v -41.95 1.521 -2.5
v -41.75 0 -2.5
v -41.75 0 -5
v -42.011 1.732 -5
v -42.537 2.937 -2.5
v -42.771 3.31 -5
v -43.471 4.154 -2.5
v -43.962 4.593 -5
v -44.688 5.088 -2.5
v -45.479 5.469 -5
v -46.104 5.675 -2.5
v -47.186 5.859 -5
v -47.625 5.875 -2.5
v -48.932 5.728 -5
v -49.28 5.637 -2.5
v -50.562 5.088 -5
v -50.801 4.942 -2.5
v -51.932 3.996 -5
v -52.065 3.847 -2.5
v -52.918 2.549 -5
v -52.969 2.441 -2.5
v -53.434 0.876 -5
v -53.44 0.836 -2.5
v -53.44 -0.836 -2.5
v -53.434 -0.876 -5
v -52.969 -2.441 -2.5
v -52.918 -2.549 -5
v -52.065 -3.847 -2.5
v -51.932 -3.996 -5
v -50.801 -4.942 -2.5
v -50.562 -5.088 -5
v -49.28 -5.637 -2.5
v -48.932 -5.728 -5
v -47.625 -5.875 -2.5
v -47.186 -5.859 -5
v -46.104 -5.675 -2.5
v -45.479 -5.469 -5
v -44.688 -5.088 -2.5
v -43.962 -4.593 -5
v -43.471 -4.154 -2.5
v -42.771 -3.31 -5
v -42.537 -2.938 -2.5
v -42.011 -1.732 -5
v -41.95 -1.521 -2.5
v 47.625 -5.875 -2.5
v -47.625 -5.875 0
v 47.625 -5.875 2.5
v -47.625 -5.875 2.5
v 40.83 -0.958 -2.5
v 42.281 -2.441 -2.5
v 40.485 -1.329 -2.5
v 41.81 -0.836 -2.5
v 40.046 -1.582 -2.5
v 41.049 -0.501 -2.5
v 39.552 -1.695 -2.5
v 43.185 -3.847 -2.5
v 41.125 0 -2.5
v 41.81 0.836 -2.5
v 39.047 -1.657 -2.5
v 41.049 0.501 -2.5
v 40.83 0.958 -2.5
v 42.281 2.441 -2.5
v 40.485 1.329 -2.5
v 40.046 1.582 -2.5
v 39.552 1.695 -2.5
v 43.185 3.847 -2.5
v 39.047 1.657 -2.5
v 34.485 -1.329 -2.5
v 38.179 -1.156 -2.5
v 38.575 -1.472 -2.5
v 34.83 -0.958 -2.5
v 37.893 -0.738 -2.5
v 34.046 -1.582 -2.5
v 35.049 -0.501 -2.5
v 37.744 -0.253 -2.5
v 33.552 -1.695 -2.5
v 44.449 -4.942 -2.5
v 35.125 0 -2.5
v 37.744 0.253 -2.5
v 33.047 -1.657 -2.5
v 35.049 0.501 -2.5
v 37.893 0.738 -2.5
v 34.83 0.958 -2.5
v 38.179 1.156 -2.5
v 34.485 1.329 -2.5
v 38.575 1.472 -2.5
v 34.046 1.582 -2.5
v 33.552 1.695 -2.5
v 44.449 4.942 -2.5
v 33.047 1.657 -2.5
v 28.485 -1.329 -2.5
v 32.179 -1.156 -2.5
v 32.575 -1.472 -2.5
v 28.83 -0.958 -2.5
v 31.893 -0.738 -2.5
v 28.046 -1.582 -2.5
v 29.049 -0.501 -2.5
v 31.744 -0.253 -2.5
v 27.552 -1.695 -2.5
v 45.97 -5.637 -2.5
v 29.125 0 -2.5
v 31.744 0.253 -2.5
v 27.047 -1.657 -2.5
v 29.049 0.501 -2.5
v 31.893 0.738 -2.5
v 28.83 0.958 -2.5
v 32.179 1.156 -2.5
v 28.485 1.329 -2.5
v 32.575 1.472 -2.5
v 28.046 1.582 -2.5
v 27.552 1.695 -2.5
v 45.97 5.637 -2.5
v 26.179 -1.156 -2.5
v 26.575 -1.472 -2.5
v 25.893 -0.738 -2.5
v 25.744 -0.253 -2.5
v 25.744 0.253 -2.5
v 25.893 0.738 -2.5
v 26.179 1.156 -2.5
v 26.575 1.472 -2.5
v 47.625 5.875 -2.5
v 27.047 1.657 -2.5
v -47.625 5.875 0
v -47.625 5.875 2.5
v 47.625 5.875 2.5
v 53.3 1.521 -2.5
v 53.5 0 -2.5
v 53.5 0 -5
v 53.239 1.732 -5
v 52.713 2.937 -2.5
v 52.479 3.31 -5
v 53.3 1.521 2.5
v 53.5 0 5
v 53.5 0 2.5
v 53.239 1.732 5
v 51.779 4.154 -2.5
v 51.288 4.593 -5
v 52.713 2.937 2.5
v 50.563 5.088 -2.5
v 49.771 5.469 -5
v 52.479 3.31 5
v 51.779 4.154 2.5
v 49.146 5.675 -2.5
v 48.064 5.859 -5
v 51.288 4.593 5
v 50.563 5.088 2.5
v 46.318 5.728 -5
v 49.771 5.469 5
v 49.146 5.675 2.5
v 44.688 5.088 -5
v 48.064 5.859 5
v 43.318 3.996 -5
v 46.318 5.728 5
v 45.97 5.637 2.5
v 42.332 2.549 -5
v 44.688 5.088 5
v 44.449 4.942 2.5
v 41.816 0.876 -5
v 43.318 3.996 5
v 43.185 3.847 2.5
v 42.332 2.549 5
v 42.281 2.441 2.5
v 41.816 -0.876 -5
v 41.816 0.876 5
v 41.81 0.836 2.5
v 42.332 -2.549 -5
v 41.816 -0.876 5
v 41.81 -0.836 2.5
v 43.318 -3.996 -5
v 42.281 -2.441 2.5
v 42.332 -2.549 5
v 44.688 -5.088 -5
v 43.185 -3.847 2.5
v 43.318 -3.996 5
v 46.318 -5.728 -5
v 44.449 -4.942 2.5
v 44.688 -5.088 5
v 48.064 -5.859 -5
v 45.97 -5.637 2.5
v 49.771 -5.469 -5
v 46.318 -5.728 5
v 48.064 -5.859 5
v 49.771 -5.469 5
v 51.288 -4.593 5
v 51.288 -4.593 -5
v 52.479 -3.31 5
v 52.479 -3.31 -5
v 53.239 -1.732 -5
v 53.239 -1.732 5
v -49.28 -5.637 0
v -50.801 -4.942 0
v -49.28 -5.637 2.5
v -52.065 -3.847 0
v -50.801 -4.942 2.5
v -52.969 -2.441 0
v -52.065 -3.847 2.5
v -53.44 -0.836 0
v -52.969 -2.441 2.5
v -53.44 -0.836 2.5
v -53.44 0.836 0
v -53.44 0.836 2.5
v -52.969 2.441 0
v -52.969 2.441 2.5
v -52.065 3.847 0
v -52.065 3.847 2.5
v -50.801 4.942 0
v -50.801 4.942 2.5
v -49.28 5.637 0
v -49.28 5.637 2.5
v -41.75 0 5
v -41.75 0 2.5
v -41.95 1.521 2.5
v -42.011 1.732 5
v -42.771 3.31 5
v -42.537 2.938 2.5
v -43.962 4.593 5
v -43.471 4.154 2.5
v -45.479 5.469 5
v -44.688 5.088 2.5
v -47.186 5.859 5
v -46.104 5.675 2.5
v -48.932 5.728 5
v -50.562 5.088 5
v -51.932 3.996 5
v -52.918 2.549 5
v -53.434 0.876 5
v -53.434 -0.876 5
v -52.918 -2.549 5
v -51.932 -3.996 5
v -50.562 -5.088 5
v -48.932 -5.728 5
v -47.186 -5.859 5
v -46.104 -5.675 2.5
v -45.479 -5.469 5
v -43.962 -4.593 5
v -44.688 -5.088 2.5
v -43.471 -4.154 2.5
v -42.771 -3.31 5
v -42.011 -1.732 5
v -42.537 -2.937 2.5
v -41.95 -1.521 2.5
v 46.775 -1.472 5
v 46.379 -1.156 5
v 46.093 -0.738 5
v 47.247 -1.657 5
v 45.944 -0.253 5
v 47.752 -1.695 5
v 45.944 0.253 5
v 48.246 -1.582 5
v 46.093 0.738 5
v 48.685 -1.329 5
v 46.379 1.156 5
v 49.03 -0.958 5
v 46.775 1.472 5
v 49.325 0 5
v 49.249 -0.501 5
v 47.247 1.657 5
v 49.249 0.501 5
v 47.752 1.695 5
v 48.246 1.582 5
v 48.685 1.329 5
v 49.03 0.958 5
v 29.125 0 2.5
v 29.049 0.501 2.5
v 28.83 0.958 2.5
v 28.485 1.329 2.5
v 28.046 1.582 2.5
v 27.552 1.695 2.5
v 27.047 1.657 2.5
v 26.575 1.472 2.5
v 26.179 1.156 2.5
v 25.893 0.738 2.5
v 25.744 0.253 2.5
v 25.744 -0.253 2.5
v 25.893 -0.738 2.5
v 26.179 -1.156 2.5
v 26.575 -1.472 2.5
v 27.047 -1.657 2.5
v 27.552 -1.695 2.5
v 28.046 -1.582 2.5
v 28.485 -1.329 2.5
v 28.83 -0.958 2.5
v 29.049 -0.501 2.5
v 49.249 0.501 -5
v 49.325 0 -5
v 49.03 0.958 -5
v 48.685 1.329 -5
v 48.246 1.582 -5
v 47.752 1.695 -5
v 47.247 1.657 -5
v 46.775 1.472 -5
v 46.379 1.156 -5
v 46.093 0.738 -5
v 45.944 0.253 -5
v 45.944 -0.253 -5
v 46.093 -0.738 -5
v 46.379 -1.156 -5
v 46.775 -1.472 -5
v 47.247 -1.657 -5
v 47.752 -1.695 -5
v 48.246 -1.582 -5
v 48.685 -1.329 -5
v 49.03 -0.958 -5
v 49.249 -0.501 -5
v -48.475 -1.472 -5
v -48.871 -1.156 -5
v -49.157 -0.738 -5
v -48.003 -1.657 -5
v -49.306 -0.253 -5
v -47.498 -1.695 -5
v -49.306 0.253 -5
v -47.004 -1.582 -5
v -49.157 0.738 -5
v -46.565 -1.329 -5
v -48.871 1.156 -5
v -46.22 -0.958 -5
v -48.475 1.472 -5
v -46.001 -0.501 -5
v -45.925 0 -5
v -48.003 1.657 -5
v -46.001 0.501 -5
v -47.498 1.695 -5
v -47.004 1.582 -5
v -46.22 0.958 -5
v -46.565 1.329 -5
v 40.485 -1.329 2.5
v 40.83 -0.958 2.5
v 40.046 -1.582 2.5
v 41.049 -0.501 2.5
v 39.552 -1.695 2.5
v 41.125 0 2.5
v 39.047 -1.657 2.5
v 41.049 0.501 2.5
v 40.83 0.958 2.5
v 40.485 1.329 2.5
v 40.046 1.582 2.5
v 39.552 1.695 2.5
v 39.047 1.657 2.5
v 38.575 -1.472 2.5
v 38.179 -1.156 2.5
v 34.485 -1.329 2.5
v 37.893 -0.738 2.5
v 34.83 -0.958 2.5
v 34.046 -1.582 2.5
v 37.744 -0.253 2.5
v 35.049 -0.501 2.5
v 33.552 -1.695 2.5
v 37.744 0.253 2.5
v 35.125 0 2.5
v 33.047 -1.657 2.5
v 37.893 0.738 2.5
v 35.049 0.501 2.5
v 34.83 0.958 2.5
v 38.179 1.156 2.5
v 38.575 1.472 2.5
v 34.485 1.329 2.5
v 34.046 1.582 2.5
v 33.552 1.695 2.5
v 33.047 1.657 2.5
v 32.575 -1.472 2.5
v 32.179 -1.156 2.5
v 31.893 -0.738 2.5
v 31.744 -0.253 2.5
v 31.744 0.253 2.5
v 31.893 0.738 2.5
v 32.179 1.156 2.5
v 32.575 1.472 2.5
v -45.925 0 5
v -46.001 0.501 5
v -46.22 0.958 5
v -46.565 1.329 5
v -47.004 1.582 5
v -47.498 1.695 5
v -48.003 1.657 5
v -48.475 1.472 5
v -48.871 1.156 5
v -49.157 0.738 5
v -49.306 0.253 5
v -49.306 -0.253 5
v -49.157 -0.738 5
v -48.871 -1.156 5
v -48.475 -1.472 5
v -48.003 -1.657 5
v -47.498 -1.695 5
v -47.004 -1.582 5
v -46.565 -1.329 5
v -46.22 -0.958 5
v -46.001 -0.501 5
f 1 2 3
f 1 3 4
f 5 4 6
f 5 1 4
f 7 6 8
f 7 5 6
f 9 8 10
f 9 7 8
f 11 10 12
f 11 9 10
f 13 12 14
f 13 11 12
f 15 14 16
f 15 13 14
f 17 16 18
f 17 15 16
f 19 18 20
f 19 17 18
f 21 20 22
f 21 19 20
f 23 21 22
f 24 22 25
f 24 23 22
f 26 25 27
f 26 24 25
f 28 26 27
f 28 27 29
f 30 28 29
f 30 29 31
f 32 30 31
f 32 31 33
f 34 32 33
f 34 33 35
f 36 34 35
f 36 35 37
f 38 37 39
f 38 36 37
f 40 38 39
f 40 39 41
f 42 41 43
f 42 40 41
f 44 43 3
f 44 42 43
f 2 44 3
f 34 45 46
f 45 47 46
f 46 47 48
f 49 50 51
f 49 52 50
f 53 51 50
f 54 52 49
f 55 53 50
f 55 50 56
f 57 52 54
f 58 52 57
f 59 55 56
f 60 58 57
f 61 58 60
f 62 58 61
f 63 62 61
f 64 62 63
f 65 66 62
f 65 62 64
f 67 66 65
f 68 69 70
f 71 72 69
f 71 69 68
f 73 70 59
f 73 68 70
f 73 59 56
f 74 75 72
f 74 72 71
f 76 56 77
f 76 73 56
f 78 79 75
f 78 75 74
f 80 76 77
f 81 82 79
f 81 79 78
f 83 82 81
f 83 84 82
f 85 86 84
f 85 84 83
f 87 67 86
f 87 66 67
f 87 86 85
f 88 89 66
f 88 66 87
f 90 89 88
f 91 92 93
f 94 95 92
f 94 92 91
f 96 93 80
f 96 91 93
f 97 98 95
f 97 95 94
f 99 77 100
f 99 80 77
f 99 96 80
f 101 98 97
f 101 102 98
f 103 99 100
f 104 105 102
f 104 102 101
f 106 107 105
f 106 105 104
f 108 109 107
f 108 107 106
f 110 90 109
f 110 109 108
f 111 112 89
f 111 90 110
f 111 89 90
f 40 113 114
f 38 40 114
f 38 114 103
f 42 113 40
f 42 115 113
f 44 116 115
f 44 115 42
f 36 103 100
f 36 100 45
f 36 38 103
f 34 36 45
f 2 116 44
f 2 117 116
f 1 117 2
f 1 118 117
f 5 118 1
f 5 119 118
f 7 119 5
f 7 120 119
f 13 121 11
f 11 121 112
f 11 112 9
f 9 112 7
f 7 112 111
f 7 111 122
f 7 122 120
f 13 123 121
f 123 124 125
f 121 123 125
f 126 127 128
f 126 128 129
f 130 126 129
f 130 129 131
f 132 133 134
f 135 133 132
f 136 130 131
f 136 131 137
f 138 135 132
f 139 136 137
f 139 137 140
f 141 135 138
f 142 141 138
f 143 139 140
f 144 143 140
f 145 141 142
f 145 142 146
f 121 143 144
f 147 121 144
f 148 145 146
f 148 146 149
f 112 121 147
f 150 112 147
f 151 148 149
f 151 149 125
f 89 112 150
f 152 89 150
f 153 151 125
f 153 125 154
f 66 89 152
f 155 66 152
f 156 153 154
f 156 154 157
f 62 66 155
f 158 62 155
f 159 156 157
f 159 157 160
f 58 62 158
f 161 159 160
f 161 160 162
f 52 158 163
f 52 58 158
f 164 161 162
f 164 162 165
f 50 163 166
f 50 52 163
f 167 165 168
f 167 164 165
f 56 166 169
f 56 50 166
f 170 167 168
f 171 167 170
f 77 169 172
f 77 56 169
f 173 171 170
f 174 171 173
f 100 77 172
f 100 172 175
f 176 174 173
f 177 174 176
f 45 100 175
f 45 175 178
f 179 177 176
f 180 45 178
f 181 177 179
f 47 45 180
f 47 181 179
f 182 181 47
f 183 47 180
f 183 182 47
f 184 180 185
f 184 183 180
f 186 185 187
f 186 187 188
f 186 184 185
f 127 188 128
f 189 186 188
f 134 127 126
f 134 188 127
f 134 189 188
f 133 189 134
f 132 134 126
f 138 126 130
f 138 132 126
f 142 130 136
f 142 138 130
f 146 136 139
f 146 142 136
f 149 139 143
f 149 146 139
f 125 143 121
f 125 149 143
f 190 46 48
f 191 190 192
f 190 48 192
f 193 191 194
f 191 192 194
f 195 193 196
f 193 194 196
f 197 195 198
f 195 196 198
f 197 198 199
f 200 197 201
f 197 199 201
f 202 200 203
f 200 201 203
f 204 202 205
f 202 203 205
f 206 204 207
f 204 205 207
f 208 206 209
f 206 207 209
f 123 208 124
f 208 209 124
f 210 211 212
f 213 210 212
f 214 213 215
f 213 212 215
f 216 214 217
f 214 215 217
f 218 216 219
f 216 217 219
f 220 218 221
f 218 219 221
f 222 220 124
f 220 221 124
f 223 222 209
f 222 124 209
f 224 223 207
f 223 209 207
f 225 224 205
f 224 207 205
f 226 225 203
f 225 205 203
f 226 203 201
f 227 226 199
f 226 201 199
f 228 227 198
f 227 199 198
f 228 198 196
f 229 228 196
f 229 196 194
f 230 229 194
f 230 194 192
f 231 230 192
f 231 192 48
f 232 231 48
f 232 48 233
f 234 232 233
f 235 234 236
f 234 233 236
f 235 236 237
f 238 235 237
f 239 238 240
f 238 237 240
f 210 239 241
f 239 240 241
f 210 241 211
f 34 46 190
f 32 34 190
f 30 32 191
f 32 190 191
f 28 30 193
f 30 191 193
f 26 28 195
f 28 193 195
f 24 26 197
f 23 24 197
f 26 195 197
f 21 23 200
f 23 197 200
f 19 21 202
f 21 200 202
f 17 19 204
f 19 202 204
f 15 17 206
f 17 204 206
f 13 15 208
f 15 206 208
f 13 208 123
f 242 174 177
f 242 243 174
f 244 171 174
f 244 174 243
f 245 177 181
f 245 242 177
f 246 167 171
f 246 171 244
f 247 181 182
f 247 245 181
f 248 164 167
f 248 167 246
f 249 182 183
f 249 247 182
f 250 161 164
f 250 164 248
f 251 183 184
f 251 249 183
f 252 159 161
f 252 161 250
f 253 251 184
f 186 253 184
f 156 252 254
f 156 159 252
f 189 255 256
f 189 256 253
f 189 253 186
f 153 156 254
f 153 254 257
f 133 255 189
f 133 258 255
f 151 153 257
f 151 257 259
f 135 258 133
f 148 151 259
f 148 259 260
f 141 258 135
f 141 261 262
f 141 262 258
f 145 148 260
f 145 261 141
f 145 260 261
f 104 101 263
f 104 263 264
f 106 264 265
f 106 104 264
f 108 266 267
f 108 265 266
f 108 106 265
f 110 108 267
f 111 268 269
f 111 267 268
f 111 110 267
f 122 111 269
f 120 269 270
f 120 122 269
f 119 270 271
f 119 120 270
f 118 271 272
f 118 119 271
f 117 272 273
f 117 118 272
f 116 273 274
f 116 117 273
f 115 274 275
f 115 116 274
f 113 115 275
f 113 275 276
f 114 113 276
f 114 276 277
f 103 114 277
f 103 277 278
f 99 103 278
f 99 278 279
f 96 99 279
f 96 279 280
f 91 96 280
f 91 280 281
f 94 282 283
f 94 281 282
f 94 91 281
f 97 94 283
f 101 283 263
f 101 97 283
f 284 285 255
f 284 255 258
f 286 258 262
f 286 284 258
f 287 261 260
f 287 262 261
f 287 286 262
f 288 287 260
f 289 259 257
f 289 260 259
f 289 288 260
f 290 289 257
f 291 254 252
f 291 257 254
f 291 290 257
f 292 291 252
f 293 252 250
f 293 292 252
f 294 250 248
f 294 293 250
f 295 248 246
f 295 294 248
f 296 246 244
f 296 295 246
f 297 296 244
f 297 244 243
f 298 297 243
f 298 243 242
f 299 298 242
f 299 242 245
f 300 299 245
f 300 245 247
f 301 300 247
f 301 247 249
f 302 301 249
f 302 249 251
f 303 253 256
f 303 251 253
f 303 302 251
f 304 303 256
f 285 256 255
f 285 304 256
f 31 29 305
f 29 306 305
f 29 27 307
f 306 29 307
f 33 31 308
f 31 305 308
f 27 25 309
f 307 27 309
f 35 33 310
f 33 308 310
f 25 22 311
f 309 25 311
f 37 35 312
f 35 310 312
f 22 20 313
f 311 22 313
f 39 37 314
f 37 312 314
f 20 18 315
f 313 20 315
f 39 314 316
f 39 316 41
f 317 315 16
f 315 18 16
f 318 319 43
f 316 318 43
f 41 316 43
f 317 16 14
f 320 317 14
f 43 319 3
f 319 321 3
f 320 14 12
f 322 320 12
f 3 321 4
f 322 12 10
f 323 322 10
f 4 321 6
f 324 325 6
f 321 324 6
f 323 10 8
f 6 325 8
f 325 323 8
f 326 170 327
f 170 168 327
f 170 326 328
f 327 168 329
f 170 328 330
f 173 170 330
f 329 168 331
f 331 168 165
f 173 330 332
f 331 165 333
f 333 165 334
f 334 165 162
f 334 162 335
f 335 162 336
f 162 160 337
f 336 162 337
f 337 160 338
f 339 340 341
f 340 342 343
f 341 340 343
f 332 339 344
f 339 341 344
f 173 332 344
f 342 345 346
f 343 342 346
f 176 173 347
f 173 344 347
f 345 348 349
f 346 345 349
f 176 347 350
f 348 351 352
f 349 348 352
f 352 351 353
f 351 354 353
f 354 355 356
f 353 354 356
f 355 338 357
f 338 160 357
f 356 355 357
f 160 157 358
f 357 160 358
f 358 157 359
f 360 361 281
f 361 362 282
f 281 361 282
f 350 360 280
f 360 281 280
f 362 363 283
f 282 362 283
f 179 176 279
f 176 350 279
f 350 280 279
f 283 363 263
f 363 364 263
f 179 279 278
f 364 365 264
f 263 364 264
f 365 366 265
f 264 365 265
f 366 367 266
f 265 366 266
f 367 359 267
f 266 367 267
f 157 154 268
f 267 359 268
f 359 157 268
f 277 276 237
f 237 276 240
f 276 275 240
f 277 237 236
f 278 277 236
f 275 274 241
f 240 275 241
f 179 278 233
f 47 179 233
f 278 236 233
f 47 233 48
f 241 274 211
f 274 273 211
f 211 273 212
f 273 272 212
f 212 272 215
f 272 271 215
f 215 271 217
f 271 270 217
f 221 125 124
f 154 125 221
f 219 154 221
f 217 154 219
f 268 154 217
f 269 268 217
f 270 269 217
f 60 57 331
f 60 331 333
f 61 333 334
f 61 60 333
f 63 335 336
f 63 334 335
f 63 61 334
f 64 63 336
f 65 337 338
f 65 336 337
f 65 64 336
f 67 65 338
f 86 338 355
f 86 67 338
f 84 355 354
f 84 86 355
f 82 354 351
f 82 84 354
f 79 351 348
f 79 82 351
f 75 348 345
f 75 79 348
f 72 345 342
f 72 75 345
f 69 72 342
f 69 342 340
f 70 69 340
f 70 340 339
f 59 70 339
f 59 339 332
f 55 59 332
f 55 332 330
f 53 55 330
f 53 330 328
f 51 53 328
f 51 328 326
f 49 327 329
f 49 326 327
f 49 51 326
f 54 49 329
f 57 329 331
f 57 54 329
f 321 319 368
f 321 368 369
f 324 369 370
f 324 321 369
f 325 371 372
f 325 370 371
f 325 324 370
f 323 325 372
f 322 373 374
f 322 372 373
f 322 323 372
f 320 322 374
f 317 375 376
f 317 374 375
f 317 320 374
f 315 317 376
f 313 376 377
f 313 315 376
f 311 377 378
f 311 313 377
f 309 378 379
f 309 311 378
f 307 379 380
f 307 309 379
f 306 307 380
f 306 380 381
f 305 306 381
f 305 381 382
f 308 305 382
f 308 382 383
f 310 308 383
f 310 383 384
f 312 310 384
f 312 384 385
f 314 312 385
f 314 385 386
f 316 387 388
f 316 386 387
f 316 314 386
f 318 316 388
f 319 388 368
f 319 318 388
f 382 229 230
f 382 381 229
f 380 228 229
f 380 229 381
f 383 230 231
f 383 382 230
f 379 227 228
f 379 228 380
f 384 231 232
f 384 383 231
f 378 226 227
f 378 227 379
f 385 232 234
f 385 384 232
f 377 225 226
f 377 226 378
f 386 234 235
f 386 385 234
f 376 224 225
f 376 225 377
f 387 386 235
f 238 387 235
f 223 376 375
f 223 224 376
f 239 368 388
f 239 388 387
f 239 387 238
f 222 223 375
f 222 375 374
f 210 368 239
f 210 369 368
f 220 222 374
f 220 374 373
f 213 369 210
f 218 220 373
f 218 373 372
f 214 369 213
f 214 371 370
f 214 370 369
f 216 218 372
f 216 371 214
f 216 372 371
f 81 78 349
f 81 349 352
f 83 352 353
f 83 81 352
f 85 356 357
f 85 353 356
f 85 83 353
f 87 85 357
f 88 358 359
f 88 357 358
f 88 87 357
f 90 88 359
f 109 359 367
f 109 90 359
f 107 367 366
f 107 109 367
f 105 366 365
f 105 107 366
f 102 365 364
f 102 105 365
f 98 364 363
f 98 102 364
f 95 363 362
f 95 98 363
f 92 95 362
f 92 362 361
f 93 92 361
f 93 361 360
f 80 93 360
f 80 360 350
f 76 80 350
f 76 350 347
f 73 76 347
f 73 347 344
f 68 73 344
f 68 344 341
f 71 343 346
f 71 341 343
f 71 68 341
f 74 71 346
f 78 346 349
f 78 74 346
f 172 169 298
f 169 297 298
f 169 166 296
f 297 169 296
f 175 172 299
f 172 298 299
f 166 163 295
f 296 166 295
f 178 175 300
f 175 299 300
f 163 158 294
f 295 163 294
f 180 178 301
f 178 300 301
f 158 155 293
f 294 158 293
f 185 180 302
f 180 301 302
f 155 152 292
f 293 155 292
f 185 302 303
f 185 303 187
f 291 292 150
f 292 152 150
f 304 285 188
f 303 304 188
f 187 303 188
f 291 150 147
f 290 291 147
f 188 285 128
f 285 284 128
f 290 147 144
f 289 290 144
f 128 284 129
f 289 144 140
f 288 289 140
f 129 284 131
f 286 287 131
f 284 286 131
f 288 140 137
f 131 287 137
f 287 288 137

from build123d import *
from build123d.topology import SkipClean

# Parameters (mm, degrees)
BOSS_EXTRUDE1_DEPTH     = 2.5
SKETCH3_R               = 5.875
BOSS_EXTRUDE2_DEPTH     = 5
CUT_EXTRUDE1_DEPTH      = 55.053359054
CUT_EXTRUDE1_DEPTH_BACK = 55.053359054
SKETCH2_R               = 1.7
CUT_EXTRUDE2_DEPTH      = 55.341656443
CUT_EXTRUDE2_DEPTH_BACK = 55.341656443
SKETCH4_R               = 1.7


with BuildPart() as part:
    # Sketch1 → Boss-Extrude1 (new, symmetric)
    with BuildSketch(Plane.XY):
        with BuildLine():
            Line((-47.625, 5.875), (47.625, 5.875))
            ThreePointArc((47.625, 5.875), (53.5, 0), (47.625, -5.875))
            Line((47.625, -5.875), (-47.625, -5.875))
            ThreePointArc((-47.625, -5.875), (-53.5, 0), (-47.625, 5.875))
        make_face()
    extrude(amount=BOSS_EXTRUDE1_DEPTH, both=True)

    # Sketch3 → Boss-Extrude2 (add, symmetric)
    with SkipClean():  # the faces are left unmerged after this step: merging them gives an invalid solid
        with BuildSketch(Plane.XY):
            with Locations((-47.625, 0)):
                Circle(SKETCH3_R)
            with Locations((47.625, 0)):
                Circle(SKETCH3_R)
        extrude(amount=BOSS_EXTRUDE2_DEPTH, both=True)
    add(part.part.scale(1), mode=Mode.REPLACE)  # the faces are merged on a copy

    # Sketch2 → Cut-Extrude1 (cut, two sides: drawn at the far end of the back side and taken through both)
    with BuildSketch(Plane.XY.offset(-CUT_EXTRUDE1_DEPTH_BACK)):
        with Locations((-47.625, 0)):
            Circle(SKETCH2_R)
        with Locations((47.625, 0)):
            Circle(SKETCH2_R)
    extrude(amount=CUT_EXTRUDE1_DEPTH + CUT_EXTRUDE1_DEPTH_BACK, mode=Mode.SUBTRACT)

    # Sketch4 → Cut-Extrude2 (cut, two sides: drawn at the far end of the back side and taken through both)
    with BuildSketch(Plane.XY.offset(2.5).offset(-CUT_EXTRUDE2_DEPTH_BACK)):
        with Locations((33.425, 0)):
            Circle(SKETCH4_R)
        with Locations((27.425, 0)):
            Circle(SKETCH4_R)
        with Locations((39.425, 0)):
            Circle(SKETCH4_R)
    extrude(amount=CUT_EXTRUDE2_DEPTH + CUT_EXTRUDE2_DEPTH_BACK, mode=Mode.SUBTRACT)


solid = part.part
